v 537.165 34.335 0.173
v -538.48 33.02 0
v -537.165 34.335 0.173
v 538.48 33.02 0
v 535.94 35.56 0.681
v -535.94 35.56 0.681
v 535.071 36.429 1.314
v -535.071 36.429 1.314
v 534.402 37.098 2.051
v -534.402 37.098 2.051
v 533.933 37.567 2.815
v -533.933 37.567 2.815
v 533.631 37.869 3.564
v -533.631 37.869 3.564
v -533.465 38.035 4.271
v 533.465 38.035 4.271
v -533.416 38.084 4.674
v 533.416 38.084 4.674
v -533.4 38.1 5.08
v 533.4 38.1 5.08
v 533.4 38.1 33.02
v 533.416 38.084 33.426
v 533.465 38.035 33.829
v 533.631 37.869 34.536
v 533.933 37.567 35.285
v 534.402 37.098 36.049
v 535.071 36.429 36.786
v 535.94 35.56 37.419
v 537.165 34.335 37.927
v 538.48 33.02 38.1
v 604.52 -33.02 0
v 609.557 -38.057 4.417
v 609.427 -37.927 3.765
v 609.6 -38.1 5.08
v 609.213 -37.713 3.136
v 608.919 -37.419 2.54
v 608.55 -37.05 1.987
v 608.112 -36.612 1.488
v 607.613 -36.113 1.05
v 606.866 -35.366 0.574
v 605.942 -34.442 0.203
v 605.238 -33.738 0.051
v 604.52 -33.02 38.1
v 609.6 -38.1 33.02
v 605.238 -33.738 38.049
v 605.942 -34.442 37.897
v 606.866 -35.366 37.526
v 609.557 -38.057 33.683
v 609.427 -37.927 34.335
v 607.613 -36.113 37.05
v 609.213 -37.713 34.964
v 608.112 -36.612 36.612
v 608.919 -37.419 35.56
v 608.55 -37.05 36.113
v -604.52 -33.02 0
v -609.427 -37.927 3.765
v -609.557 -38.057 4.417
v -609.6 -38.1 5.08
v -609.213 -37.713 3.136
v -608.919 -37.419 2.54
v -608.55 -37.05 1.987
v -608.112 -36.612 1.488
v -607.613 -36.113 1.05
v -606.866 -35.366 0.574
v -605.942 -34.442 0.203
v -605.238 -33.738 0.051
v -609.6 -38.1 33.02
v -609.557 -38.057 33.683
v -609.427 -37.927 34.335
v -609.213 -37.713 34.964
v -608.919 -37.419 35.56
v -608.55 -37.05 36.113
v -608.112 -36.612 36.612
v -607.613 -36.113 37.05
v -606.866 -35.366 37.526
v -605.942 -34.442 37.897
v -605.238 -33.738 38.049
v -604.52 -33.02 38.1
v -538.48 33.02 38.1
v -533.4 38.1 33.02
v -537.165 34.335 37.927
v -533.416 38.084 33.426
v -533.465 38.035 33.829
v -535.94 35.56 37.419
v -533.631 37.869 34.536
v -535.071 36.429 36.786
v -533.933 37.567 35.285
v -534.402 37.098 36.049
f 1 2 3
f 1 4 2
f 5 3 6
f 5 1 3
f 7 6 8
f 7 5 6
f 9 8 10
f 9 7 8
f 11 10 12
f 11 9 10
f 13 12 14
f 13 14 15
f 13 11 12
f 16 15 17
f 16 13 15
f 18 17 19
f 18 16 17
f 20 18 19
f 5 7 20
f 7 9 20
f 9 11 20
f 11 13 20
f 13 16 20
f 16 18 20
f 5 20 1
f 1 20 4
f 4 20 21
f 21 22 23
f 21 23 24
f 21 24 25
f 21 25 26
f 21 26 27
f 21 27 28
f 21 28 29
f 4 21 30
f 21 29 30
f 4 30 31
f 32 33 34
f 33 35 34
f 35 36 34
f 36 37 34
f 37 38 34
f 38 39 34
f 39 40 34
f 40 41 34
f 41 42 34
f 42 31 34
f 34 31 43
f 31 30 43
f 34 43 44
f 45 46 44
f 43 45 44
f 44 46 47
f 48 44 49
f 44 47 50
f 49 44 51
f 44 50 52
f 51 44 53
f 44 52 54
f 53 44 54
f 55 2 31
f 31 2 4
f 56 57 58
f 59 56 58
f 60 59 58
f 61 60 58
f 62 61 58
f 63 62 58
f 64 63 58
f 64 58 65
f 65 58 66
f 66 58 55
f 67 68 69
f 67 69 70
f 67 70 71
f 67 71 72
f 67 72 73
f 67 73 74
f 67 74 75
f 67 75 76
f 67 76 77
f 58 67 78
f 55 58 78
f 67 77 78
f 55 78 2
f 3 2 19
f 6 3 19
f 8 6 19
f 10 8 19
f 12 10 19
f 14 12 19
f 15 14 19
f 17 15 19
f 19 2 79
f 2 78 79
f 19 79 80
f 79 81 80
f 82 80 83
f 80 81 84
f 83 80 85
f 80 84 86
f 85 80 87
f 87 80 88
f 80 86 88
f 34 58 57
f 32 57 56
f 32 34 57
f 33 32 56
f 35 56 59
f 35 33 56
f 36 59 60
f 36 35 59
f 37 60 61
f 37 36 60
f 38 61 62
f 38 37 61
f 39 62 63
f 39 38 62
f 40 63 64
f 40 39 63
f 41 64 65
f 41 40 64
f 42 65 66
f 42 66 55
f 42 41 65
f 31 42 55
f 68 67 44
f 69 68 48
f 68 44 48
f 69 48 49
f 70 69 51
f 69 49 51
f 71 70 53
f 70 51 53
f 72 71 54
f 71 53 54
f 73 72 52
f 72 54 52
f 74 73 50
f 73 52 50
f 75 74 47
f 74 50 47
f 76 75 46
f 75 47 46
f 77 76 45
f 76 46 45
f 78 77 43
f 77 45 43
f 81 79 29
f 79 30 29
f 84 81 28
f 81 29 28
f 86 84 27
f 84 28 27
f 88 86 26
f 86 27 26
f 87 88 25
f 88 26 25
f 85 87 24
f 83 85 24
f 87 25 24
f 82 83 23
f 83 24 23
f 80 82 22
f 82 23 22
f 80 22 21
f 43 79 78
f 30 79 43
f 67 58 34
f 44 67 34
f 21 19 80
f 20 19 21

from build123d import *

# Parameters (mm, degrees)
F0_W     = 1219.2
F0_H     = 76.2
F1_DEPTH = 38.1
F3_DEPTH = 38.101
F4_R     = 5.08


with BuildPart() as f1:
    # F0 (on Top) → F1 (new body)
    with BuildSketch(Plane.XY):
        Rectangle(F0_W, F0_H)
    extrude(amount=F1_DEPTH)

    # F2 (on face) → F3 (cut, through all)
    with BuildSketch(Plane.XY.offset(38.1)):
        Polygon((-609.6, 38.1), (-609.6, -38.1), (-533.4, 38.1), align=None)
        Polygon((533.4, 38.1), (609.6, -38.1), (609.6, 38.1), align=None)
    extrude(amount=-F3_DEPTH, mode=Mode.SUBTRACT)

    # F4
    f4_edges = [f1.edges().sort_by_distance(p)[0] for p in [
        (0, 38.1, 0),
        (0, -38.1, 0),
        (0, -38.1, 38.1),
        (0, 38.1, 38.1),
    ]]
    fillet(f4_edges, radius=F4_R)


solid = f1.part
